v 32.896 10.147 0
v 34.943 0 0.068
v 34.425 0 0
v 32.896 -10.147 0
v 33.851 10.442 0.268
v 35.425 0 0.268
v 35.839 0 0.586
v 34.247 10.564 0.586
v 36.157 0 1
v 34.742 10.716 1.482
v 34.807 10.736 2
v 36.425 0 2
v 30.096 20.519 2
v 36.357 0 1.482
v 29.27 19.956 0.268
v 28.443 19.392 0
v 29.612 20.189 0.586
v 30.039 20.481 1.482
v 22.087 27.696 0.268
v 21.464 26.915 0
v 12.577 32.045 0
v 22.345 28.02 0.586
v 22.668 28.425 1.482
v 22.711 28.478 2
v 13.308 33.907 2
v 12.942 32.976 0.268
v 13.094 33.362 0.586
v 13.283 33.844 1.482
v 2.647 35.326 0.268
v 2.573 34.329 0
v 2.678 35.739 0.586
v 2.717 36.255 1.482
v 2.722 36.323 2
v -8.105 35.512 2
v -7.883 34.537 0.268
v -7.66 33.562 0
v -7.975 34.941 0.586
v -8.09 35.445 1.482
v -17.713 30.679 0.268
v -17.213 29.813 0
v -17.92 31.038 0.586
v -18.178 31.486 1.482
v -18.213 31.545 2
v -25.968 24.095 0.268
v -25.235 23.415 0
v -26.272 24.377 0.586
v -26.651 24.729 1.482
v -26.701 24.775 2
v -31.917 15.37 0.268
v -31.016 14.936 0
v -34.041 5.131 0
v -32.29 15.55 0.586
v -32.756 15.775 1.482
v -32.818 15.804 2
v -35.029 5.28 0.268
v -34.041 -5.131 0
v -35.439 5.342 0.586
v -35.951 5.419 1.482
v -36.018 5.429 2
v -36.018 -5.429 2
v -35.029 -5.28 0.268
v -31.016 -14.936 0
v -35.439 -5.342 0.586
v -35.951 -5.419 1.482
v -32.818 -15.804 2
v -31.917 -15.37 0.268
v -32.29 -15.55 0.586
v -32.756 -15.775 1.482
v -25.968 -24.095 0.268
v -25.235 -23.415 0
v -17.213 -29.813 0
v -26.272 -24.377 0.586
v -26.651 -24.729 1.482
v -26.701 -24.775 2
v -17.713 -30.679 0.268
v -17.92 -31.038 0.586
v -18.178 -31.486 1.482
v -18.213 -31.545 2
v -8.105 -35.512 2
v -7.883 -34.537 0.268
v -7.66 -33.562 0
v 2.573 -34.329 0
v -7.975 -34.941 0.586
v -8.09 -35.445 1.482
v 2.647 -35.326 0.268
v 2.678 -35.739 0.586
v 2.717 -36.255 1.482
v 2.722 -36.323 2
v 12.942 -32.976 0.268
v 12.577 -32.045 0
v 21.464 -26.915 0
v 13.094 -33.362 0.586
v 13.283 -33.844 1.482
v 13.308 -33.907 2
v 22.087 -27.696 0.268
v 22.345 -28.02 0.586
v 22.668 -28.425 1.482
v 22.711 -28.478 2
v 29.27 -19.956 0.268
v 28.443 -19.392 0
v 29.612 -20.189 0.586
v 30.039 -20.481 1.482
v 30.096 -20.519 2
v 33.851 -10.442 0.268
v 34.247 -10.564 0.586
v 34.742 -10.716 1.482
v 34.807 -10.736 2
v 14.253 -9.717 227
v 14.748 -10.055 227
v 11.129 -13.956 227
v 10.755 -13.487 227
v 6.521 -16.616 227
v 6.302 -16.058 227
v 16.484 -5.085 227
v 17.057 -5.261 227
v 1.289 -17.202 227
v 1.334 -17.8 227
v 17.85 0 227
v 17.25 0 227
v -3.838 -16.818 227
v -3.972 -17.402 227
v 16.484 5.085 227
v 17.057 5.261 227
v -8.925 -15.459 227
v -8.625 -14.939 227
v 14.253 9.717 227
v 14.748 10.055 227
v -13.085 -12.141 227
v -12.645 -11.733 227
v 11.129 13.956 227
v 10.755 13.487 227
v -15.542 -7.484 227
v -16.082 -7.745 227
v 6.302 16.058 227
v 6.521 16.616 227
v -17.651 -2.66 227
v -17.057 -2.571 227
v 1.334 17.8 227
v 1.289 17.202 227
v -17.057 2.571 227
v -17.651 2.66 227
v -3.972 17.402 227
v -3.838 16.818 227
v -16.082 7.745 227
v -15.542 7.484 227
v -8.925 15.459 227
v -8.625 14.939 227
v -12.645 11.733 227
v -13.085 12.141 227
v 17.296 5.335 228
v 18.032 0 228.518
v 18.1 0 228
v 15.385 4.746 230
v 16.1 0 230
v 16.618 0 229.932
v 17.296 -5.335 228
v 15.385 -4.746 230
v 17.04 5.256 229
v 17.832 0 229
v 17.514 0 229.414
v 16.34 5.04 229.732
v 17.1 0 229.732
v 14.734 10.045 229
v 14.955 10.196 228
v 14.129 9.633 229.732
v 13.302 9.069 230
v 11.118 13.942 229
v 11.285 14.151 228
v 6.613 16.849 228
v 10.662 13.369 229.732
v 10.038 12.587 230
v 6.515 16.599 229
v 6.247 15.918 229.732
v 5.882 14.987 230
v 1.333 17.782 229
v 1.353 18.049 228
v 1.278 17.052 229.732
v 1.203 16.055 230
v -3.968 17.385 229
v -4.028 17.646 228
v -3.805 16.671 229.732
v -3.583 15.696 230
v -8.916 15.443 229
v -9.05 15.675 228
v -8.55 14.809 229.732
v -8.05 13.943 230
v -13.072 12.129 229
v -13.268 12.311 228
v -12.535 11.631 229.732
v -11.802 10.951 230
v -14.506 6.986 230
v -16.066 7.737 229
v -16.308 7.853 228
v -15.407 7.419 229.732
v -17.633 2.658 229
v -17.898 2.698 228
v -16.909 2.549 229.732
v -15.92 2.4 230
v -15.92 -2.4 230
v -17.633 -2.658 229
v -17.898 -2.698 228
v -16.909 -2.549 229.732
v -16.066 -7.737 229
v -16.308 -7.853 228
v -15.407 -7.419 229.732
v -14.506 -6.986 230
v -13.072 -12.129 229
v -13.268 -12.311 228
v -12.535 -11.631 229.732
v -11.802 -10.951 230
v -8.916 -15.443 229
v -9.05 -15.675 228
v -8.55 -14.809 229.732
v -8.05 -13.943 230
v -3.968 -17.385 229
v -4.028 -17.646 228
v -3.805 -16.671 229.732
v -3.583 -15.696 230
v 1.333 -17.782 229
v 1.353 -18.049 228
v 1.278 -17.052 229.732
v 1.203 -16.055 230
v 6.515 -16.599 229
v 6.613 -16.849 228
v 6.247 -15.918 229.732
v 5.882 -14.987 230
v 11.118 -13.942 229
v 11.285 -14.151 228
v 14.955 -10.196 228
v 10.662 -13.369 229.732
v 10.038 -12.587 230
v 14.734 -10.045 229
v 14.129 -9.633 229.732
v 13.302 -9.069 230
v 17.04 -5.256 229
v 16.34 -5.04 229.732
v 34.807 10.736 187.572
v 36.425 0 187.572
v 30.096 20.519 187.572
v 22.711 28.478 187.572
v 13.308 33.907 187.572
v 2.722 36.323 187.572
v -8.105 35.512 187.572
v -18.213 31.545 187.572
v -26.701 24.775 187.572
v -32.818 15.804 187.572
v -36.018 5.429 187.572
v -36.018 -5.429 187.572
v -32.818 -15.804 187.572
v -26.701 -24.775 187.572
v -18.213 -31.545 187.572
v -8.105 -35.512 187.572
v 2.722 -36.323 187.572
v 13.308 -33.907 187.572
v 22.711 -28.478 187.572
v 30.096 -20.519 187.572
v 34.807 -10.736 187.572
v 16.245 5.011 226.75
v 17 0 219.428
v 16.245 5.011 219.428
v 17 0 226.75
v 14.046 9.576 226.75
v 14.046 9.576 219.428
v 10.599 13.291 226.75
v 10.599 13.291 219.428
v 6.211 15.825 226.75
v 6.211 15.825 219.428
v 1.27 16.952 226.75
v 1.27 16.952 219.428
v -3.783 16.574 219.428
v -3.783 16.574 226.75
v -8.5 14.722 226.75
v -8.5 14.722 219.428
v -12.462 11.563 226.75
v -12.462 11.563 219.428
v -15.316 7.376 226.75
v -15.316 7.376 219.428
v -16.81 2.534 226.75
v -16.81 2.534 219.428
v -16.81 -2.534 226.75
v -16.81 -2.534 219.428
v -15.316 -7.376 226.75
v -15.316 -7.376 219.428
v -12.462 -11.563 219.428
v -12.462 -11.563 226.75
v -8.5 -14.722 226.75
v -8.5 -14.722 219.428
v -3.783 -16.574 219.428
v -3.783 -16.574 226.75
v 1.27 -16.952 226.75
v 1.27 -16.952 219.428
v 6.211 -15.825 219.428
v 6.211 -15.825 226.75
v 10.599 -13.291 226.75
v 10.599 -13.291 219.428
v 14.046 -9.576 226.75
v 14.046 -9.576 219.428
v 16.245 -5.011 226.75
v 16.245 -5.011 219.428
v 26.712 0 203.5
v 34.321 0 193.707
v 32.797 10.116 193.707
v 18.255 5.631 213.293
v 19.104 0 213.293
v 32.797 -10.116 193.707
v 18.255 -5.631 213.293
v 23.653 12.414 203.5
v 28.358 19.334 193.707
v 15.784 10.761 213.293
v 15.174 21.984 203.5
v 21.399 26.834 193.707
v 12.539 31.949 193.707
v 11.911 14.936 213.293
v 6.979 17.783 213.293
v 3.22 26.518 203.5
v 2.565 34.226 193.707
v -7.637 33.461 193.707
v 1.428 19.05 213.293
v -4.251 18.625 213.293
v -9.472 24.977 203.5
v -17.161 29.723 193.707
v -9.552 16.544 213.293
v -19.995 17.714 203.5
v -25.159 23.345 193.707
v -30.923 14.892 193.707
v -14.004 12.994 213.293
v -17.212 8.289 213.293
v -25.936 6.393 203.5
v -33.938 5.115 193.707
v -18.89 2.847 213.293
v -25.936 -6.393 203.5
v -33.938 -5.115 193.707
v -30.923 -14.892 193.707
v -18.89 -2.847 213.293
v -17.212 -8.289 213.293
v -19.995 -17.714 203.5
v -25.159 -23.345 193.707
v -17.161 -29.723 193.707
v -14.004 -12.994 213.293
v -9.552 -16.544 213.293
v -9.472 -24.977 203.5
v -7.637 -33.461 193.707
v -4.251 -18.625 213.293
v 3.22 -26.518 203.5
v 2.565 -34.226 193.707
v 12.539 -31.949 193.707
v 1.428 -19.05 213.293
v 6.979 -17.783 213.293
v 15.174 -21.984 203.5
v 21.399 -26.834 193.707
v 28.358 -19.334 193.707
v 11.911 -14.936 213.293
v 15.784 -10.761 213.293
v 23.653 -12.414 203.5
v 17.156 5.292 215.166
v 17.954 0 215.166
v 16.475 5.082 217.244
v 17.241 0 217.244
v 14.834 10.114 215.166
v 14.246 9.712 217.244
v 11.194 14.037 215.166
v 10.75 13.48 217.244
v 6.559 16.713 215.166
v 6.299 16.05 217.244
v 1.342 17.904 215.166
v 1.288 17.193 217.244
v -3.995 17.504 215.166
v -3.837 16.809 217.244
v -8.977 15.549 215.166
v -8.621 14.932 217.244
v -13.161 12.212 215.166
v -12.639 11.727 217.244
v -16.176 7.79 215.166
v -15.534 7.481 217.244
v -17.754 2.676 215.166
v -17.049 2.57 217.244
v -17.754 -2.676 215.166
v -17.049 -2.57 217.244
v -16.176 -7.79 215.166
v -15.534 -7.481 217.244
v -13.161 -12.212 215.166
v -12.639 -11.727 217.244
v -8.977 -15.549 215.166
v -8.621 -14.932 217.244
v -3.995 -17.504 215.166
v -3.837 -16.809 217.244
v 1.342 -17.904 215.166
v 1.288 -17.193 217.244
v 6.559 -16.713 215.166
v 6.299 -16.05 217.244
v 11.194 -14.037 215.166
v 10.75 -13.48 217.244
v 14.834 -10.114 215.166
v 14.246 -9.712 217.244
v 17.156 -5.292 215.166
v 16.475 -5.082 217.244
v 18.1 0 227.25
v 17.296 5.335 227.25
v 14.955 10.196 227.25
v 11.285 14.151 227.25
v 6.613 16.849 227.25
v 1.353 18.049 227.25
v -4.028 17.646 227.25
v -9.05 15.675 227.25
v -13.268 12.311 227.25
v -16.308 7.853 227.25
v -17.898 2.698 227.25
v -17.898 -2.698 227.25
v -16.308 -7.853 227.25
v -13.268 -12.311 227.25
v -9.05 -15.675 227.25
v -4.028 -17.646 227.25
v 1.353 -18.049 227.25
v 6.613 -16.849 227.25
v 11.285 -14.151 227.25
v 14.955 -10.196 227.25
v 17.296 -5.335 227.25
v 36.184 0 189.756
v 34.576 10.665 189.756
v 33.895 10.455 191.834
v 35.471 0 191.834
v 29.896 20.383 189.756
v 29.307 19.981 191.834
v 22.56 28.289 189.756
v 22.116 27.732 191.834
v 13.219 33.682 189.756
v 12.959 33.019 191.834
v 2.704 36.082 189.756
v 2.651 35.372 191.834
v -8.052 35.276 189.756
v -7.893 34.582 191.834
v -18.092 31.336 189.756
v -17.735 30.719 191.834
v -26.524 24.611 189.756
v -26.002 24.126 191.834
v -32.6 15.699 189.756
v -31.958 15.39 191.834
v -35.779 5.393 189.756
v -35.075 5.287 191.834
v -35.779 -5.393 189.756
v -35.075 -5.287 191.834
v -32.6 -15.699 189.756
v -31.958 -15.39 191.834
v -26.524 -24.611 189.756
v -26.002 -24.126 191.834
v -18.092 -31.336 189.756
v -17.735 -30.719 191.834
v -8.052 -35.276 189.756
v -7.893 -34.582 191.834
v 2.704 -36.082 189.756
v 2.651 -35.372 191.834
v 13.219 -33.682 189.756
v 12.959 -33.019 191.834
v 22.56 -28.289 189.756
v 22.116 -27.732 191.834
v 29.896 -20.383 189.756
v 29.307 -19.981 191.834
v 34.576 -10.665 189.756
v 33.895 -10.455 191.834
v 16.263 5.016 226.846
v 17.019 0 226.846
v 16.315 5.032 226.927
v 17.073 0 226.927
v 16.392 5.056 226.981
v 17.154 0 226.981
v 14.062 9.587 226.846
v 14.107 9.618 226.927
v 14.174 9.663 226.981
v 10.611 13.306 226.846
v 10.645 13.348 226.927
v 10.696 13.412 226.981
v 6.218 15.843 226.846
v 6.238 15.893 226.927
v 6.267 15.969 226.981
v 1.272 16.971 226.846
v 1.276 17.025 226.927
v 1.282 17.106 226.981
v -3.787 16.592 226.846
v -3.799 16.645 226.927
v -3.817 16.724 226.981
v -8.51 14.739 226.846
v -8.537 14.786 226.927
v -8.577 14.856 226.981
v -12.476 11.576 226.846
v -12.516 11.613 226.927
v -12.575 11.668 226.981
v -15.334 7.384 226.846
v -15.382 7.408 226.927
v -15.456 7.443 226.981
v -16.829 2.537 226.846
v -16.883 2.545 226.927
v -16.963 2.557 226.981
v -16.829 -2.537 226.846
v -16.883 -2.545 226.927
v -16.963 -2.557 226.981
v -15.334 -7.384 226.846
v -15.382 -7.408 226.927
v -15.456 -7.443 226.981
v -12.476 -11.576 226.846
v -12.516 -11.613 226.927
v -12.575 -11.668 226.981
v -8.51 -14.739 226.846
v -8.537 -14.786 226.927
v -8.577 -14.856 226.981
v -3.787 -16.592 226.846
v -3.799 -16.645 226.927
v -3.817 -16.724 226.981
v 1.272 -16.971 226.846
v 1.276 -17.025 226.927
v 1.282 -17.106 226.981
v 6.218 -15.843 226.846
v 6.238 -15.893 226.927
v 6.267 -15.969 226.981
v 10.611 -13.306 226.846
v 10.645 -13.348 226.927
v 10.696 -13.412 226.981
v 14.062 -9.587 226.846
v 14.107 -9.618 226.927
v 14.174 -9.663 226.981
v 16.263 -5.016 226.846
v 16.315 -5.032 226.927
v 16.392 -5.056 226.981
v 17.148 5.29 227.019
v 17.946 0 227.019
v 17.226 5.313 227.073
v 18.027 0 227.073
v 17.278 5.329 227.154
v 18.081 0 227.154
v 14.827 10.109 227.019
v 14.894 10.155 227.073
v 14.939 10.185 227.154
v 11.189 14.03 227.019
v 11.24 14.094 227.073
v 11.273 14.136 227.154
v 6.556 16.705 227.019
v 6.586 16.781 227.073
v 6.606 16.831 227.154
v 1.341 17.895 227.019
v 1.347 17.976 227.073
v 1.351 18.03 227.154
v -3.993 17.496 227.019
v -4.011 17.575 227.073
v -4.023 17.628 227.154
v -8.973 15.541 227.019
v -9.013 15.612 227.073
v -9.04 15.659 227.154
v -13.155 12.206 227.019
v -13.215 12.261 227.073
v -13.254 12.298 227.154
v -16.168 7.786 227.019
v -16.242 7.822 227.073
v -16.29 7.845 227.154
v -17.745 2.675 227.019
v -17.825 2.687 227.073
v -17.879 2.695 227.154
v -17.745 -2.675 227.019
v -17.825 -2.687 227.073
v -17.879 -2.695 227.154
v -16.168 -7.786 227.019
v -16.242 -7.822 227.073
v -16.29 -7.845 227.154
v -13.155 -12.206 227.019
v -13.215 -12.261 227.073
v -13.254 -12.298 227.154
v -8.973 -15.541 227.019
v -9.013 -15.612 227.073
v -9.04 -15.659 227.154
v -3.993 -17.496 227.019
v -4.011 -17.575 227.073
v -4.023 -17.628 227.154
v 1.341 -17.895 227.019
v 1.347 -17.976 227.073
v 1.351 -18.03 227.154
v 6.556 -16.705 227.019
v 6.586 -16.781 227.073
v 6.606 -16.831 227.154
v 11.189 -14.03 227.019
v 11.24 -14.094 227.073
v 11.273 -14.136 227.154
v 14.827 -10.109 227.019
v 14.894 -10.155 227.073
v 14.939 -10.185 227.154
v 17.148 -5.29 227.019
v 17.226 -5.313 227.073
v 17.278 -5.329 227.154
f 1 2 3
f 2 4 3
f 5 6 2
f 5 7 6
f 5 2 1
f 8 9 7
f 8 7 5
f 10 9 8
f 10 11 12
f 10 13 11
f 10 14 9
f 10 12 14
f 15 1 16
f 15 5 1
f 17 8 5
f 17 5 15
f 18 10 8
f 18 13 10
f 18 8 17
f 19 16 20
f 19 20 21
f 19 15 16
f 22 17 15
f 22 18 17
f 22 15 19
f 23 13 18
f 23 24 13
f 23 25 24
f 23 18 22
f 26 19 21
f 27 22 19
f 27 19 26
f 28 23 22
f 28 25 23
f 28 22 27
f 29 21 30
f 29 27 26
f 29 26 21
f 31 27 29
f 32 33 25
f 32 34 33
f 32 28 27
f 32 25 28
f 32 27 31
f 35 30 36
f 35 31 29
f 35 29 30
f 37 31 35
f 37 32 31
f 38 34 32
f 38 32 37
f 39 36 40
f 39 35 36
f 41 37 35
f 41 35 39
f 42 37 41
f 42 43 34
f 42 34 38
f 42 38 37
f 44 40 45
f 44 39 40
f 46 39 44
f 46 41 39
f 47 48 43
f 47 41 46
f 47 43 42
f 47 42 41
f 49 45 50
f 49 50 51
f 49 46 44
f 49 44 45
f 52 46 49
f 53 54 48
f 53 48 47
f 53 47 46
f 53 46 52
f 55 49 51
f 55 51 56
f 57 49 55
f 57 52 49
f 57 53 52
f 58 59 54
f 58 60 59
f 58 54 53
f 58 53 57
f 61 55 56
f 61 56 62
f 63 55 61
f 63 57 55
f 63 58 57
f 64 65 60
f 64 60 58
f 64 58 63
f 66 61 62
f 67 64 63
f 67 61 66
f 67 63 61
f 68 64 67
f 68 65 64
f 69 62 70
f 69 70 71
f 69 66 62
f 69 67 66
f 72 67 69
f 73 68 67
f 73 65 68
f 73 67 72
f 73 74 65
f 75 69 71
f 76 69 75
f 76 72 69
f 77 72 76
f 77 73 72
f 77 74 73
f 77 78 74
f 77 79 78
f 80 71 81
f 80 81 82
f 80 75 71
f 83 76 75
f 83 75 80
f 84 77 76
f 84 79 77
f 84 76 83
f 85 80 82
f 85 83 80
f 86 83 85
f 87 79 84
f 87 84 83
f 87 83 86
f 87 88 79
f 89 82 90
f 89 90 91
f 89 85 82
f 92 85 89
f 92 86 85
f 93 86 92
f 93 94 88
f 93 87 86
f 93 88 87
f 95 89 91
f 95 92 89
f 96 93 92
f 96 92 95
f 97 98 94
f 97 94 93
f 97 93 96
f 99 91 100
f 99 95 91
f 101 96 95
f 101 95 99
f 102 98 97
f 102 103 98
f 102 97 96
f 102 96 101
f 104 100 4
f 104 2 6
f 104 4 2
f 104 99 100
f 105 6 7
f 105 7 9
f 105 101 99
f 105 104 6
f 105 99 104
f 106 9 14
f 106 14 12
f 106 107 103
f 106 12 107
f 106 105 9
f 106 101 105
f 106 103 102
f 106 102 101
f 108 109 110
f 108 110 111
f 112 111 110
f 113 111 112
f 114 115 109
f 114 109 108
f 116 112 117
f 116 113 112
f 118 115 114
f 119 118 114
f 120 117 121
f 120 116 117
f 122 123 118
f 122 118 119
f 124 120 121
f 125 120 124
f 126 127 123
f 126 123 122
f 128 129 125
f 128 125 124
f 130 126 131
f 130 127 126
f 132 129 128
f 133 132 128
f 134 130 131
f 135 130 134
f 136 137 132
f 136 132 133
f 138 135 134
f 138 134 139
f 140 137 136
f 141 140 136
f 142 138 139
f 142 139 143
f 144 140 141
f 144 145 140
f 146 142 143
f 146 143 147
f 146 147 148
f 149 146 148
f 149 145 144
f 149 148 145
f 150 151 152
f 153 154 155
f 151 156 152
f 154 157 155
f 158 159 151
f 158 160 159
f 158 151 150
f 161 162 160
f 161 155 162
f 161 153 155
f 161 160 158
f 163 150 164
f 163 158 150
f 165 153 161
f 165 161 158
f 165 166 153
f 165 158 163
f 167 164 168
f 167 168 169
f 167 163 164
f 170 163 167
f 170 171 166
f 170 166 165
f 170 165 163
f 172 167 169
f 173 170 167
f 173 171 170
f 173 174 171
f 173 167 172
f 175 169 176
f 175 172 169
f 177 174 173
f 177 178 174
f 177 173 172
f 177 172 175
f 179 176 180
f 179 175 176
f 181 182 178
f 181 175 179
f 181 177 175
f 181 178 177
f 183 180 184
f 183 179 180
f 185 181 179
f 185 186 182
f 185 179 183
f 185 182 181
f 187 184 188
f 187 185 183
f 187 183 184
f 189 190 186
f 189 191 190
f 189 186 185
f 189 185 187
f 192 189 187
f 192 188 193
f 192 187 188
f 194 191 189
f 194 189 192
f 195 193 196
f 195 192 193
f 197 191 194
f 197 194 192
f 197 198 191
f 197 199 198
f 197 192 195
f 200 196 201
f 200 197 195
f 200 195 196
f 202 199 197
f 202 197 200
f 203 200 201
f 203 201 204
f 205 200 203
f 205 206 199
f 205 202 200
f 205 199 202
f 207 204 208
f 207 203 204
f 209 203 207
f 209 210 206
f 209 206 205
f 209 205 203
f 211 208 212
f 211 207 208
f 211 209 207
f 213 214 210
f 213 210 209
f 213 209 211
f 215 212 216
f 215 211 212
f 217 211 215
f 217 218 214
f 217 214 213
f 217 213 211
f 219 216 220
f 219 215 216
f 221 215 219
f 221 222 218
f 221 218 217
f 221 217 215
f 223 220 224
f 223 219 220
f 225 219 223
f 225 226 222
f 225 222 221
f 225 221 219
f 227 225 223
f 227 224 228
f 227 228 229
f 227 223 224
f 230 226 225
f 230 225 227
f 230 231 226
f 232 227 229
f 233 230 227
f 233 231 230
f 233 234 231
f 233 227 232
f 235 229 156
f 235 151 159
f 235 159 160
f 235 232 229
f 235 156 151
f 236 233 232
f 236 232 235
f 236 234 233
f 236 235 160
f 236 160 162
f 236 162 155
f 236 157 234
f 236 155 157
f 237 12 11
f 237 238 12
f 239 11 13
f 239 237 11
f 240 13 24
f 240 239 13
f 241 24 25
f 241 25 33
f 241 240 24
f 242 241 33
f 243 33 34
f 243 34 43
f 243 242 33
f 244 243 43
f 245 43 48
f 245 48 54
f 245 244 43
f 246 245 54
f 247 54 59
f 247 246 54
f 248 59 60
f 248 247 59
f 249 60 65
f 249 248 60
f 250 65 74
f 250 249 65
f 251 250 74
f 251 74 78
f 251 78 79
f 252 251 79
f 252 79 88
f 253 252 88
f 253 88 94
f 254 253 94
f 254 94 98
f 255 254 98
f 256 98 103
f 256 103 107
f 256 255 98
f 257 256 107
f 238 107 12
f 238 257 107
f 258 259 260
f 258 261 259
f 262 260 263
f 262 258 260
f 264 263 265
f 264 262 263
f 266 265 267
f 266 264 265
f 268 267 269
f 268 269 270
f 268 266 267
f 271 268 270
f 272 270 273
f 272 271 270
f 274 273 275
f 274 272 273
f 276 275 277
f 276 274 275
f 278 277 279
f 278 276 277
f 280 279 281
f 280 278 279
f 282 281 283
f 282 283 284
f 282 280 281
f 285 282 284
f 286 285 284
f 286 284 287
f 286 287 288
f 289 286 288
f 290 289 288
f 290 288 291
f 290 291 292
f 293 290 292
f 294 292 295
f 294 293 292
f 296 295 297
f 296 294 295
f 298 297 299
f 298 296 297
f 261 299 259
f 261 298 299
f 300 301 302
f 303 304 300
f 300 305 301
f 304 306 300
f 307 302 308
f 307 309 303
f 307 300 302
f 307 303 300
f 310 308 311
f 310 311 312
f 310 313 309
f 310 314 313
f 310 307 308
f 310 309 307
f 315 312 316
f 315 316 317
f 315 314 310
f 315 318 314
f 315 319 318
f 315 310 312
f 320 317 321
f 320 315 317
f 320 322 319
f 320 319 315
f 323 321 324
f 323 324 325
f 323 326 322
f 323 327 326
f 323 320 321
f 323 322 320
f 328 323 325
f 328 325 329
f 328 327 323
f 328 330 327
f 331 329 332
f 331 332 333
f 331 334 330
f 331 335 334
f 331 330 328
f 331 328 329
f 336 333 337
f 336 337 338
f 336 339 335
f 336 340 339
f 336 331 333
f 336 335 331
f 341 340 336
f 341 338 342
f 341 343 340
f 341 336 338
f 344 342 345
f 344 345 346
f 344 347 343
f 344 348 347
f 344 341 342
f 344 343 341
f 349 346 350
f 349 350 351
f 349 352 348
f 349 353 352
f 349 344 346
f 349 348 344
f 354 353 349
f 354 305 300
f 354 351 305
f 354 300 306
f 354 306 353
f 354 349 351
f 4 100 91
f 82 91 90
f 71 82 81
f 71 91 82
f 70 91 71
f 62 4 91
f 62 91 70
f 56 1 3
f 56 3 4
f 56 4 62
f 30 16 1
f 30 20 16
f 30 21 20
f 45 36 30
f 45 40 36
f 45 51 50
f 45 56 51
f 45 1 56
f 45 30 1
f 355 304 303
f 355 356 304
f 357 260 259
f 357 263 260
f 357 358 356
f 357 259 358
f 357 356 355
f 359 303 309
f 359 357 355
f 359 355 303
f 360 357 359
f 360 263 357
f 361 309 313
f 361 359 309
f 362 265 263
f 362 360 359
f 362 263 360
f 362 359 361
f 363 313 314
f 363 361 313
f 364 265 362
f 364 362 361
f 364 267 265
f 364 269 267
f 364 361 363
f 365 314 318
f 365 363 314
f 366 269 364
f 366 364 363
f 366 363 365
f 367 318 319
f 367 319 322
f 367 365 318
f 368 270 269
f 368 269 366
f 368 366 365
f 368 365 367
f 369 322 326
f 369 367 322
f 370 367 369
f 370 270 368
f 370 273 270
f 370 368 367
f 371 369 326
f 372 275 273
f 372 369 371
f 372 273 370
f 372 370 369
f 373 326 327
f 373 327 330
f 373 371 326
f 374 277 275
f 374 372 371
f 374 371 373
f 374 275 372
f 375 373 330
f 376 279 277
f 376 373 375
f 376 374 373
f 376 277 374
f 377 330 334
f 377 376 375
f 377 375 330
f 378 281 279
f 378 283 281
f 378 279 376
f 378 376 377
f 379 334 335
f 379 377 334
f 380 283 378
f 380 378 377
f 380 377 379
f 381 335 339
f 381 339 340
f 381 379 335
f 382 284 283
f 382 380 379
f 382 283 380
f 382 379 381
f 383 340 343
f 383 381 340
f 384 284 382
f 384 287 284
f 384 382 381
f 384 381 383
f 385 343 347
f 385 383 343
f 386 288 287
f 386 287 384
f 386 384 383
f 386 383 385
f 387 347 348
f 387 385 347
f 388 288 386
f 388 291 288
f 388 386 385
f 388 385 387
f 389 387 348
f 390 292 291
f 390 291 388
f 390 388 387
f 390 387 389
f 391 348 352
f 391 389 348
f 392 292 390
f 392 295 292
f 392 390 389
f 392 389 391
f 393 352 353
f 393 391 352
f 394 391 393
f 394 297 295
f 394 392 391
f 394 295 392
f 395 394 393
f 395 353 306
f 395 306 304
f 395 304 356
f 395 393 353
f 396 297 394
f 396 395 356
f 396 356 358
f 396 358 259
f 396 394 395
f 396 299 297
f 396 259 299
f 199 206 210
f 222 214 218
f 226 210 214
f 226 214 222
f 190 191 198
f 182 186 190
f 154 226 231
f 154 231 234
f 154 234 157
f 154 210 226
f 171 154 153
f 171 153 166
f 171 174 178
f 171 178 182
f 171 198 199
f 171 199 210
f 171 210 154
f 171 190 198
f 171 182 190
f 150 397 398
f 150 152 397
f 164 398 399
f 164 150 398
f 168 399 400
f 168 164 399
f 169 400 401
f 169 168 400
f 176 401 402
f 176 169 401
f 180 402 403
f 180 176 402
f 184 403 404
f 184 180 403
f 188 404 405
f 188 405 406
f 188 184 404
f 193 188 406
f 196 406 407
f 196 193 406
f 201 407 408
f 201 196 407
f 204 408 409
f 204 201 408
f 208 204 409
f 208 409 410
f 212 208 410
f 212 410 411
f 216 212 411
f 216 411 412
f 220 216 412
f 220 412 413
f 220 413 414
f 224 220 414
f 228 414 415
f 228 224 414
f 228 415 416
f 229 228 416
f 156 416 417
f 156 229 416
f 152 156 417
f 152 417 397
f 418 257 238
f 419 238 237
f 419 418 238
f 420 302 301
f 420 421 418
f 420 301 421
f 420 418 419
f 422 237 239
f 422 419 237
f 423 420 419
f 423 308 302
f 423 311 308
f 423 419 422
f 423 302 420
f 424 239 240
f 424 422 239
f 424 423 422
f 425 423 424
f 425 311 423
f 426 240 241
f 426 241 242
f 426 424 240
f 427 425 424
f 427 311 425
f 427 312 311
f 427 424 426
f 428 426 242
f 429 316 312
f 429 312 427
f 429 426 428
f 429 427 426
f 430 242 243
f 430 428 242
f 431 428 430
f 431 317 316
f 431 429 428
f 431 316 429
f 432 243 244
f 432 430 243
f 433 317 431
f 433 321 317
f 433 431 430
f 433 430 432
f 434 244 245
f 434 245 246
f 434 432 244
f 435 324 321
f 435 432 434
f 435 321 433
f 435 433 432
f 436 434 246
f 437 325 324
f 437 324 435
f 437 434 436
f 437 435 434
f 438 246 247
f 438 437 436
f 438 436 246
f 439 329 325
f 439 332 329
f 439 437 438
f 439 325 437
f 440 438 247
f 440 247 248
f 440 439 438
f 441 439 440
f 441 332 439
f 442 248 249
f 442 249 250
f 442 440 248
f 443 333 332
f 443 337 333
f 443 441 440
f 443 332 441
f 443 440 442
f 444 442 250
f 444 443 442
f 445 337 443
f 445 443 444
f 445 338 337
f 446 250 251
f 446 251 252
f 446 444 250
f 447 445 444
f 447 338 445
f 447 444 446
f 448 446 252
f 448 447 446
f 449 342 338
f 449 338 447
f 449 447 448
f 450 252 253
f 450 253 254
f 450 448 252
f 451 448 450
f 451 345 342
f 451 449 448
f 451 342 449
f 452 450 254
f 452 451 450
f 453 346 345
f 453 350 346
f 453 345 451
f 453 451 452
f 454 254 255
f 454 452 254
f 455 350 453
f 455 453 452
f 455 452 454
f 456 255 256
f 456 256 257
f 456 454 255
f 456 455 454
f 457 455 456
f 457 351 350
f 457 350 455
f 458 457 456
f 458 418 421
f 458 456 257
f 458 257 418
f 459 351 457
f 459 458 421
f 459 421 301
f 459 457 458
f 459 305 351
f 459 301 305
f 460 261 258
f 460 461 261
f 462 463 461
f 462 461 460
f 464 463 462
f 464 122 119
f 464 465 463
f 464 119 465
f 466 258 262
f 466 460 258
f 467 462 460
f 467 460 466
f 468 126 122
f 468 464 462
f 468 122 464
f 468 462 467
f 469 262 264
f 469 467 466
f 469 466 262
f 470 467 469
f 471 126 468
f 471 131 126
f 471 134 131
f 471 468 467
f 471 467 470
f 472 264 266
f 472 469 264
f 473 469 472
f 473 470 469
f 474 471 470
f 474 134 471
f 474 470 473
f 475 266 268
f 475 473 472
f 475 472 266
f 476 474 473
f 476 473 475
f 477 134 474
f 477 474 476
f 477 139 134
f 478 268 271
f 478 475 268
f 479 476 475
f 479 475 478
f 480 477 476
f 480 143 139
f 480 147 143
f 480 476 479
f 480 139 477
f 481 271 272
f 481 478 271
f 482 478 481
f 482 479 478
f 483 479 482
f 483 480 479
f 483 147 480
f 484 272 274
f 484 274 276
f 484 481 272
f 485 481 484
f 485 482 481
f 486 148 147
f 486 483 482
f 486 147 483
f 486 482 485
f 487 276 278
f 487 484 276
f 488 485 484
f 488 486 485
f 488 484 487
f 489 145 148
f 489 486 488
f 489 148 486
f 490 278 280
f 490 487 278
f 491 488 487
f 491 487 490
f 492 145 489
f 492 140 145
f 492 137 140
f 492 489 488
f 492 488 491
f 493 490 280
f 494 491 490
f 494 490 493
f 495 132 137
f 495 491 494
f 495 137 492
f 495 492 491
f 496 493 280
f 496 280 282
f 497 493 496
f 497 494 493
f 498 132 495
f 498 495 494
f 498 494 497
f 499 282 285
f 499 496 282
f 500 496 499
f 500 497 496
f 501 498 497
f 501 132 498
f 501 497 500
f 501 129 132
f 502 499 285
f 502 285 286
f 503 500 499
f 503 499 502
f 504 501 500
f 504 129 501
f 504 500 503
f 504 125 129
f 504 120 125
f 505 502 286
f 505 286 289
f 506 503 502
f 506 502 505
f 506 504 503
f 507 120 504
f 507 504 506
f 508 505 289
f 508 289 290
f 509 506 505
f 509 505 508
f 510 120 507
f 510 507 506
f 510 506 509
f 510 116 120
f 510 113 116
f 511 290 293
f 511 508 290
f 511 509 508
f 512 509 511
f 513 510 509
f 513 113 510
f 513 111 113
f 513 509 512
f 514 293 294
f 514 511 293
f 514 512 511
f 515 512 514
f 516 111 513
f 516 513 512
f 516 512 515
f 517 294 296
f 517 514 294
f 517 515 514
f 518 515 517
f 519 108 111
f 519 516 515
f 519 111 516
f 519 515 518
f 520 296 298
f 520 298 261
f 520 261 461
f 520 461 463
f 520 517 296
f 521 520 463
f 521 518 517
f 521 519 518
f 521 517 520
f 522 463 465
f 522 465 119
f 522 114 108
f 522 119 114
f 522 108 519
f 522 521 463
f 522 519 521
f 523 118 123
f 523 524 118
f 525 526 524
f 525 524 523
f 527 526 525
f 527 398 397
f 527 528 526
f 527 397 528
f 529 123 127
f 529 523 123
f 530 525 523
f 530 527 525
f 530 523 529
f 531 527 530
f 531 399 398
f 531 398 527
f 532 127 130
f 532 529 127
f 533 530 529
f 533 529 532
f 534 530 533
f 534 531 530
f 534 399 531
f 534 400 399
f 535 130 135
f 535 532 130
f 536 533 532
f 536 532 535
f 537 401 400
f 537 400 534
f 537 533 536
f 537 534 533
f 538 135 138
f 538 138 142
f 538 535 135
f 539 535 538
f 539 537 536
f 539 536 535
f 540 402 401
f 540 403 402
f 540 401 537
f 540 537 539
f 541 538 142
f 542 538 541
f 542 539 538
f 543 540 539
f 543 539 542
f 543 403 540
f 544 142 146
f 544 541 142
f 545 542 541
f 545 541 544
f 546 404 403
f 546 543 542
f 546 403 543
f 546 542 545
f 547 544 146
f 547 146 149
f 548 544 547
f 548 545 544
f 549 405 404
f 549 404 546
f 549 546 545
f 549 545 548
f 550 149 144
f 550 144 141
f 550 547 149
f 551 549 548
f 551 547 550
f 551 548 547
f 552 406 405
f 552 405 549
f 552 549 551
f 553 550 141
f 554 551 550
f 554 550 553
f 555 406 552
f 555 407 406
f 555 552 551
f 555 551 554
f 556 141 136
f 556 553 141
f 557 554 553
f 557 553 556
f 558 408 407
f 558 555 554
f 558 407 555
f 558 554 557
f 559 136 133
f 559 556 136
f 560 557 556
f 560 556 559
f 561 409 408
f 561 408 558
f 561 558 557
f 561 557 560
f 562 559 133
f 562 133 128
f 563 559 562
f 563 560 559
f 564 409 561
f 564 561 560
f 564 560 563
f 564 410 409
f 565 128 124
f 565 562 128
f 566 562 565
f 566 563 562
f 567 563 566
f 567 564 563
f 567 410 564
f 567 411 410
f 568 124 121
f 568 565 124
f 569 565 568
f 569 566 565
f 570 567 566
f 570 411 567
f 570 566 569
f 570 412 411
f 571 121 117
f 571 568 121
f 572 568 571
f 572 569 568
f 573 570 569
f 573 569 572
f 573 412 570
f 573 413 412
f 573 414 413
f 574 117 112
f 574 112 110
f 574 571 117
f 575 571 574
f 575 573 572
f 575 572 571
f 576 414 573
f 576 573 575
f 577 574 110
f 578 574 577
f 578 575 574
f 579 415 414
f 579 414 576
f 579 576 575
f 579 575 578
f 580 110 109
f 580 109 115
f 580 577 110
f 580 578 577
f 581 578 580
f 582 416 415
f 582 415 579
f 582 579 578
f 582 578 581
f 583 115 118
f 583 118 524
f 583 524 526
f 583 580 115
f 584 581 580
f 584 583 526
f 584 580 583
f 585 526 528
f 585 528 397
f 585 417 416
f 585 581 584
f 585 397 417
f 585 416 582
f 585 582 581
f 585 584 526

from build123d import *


with BuildPart() as f1:
    # F0 (on Front) → F1 (revolve)
    with BuildSketch(Plane.XZ):
        with BuildLine():
            Line((0, 230), (0, 0))
            Line((0, 0), (34.425, 0))
            ThreePointArc((34.425, 0), (35.839214, 0.585786), (36.425, 2))
            Line((36.425, 2), (36.425, 187.571632))
            ThreePointArc((36.425, 187.571632), (35.884518, 190.814703), (34.321498, 193.70721))
            Line((34.321498, 193.70721), (19.103502, 213.29279))
            ThreePointArc((19.103502, 213.29279), (17.540482, 216.185297), (17, 219.428368))
            Line((17, 219.428368), (17, 226.75))
            ThreePointArc((17, 226.75), (17.073223, 226.926777), (17.25, 227))
            Line((17.25, 227), (17.85, 227))
            ThreePointArc((17.85, 227), (18.026777, 227.073223), (18.1, 227.25))
            Line((18.1, 227.25), (18.1, 228))
            ThreePointArc((18.1, 228), (17.514214, 229.414214), (16.1, 230))
            Line((16.1, 230), (0, 230))
        make_face()
    revolve(axis=Axis((0, 0, 115), (0, 0, 1)))


solid = f1.part
